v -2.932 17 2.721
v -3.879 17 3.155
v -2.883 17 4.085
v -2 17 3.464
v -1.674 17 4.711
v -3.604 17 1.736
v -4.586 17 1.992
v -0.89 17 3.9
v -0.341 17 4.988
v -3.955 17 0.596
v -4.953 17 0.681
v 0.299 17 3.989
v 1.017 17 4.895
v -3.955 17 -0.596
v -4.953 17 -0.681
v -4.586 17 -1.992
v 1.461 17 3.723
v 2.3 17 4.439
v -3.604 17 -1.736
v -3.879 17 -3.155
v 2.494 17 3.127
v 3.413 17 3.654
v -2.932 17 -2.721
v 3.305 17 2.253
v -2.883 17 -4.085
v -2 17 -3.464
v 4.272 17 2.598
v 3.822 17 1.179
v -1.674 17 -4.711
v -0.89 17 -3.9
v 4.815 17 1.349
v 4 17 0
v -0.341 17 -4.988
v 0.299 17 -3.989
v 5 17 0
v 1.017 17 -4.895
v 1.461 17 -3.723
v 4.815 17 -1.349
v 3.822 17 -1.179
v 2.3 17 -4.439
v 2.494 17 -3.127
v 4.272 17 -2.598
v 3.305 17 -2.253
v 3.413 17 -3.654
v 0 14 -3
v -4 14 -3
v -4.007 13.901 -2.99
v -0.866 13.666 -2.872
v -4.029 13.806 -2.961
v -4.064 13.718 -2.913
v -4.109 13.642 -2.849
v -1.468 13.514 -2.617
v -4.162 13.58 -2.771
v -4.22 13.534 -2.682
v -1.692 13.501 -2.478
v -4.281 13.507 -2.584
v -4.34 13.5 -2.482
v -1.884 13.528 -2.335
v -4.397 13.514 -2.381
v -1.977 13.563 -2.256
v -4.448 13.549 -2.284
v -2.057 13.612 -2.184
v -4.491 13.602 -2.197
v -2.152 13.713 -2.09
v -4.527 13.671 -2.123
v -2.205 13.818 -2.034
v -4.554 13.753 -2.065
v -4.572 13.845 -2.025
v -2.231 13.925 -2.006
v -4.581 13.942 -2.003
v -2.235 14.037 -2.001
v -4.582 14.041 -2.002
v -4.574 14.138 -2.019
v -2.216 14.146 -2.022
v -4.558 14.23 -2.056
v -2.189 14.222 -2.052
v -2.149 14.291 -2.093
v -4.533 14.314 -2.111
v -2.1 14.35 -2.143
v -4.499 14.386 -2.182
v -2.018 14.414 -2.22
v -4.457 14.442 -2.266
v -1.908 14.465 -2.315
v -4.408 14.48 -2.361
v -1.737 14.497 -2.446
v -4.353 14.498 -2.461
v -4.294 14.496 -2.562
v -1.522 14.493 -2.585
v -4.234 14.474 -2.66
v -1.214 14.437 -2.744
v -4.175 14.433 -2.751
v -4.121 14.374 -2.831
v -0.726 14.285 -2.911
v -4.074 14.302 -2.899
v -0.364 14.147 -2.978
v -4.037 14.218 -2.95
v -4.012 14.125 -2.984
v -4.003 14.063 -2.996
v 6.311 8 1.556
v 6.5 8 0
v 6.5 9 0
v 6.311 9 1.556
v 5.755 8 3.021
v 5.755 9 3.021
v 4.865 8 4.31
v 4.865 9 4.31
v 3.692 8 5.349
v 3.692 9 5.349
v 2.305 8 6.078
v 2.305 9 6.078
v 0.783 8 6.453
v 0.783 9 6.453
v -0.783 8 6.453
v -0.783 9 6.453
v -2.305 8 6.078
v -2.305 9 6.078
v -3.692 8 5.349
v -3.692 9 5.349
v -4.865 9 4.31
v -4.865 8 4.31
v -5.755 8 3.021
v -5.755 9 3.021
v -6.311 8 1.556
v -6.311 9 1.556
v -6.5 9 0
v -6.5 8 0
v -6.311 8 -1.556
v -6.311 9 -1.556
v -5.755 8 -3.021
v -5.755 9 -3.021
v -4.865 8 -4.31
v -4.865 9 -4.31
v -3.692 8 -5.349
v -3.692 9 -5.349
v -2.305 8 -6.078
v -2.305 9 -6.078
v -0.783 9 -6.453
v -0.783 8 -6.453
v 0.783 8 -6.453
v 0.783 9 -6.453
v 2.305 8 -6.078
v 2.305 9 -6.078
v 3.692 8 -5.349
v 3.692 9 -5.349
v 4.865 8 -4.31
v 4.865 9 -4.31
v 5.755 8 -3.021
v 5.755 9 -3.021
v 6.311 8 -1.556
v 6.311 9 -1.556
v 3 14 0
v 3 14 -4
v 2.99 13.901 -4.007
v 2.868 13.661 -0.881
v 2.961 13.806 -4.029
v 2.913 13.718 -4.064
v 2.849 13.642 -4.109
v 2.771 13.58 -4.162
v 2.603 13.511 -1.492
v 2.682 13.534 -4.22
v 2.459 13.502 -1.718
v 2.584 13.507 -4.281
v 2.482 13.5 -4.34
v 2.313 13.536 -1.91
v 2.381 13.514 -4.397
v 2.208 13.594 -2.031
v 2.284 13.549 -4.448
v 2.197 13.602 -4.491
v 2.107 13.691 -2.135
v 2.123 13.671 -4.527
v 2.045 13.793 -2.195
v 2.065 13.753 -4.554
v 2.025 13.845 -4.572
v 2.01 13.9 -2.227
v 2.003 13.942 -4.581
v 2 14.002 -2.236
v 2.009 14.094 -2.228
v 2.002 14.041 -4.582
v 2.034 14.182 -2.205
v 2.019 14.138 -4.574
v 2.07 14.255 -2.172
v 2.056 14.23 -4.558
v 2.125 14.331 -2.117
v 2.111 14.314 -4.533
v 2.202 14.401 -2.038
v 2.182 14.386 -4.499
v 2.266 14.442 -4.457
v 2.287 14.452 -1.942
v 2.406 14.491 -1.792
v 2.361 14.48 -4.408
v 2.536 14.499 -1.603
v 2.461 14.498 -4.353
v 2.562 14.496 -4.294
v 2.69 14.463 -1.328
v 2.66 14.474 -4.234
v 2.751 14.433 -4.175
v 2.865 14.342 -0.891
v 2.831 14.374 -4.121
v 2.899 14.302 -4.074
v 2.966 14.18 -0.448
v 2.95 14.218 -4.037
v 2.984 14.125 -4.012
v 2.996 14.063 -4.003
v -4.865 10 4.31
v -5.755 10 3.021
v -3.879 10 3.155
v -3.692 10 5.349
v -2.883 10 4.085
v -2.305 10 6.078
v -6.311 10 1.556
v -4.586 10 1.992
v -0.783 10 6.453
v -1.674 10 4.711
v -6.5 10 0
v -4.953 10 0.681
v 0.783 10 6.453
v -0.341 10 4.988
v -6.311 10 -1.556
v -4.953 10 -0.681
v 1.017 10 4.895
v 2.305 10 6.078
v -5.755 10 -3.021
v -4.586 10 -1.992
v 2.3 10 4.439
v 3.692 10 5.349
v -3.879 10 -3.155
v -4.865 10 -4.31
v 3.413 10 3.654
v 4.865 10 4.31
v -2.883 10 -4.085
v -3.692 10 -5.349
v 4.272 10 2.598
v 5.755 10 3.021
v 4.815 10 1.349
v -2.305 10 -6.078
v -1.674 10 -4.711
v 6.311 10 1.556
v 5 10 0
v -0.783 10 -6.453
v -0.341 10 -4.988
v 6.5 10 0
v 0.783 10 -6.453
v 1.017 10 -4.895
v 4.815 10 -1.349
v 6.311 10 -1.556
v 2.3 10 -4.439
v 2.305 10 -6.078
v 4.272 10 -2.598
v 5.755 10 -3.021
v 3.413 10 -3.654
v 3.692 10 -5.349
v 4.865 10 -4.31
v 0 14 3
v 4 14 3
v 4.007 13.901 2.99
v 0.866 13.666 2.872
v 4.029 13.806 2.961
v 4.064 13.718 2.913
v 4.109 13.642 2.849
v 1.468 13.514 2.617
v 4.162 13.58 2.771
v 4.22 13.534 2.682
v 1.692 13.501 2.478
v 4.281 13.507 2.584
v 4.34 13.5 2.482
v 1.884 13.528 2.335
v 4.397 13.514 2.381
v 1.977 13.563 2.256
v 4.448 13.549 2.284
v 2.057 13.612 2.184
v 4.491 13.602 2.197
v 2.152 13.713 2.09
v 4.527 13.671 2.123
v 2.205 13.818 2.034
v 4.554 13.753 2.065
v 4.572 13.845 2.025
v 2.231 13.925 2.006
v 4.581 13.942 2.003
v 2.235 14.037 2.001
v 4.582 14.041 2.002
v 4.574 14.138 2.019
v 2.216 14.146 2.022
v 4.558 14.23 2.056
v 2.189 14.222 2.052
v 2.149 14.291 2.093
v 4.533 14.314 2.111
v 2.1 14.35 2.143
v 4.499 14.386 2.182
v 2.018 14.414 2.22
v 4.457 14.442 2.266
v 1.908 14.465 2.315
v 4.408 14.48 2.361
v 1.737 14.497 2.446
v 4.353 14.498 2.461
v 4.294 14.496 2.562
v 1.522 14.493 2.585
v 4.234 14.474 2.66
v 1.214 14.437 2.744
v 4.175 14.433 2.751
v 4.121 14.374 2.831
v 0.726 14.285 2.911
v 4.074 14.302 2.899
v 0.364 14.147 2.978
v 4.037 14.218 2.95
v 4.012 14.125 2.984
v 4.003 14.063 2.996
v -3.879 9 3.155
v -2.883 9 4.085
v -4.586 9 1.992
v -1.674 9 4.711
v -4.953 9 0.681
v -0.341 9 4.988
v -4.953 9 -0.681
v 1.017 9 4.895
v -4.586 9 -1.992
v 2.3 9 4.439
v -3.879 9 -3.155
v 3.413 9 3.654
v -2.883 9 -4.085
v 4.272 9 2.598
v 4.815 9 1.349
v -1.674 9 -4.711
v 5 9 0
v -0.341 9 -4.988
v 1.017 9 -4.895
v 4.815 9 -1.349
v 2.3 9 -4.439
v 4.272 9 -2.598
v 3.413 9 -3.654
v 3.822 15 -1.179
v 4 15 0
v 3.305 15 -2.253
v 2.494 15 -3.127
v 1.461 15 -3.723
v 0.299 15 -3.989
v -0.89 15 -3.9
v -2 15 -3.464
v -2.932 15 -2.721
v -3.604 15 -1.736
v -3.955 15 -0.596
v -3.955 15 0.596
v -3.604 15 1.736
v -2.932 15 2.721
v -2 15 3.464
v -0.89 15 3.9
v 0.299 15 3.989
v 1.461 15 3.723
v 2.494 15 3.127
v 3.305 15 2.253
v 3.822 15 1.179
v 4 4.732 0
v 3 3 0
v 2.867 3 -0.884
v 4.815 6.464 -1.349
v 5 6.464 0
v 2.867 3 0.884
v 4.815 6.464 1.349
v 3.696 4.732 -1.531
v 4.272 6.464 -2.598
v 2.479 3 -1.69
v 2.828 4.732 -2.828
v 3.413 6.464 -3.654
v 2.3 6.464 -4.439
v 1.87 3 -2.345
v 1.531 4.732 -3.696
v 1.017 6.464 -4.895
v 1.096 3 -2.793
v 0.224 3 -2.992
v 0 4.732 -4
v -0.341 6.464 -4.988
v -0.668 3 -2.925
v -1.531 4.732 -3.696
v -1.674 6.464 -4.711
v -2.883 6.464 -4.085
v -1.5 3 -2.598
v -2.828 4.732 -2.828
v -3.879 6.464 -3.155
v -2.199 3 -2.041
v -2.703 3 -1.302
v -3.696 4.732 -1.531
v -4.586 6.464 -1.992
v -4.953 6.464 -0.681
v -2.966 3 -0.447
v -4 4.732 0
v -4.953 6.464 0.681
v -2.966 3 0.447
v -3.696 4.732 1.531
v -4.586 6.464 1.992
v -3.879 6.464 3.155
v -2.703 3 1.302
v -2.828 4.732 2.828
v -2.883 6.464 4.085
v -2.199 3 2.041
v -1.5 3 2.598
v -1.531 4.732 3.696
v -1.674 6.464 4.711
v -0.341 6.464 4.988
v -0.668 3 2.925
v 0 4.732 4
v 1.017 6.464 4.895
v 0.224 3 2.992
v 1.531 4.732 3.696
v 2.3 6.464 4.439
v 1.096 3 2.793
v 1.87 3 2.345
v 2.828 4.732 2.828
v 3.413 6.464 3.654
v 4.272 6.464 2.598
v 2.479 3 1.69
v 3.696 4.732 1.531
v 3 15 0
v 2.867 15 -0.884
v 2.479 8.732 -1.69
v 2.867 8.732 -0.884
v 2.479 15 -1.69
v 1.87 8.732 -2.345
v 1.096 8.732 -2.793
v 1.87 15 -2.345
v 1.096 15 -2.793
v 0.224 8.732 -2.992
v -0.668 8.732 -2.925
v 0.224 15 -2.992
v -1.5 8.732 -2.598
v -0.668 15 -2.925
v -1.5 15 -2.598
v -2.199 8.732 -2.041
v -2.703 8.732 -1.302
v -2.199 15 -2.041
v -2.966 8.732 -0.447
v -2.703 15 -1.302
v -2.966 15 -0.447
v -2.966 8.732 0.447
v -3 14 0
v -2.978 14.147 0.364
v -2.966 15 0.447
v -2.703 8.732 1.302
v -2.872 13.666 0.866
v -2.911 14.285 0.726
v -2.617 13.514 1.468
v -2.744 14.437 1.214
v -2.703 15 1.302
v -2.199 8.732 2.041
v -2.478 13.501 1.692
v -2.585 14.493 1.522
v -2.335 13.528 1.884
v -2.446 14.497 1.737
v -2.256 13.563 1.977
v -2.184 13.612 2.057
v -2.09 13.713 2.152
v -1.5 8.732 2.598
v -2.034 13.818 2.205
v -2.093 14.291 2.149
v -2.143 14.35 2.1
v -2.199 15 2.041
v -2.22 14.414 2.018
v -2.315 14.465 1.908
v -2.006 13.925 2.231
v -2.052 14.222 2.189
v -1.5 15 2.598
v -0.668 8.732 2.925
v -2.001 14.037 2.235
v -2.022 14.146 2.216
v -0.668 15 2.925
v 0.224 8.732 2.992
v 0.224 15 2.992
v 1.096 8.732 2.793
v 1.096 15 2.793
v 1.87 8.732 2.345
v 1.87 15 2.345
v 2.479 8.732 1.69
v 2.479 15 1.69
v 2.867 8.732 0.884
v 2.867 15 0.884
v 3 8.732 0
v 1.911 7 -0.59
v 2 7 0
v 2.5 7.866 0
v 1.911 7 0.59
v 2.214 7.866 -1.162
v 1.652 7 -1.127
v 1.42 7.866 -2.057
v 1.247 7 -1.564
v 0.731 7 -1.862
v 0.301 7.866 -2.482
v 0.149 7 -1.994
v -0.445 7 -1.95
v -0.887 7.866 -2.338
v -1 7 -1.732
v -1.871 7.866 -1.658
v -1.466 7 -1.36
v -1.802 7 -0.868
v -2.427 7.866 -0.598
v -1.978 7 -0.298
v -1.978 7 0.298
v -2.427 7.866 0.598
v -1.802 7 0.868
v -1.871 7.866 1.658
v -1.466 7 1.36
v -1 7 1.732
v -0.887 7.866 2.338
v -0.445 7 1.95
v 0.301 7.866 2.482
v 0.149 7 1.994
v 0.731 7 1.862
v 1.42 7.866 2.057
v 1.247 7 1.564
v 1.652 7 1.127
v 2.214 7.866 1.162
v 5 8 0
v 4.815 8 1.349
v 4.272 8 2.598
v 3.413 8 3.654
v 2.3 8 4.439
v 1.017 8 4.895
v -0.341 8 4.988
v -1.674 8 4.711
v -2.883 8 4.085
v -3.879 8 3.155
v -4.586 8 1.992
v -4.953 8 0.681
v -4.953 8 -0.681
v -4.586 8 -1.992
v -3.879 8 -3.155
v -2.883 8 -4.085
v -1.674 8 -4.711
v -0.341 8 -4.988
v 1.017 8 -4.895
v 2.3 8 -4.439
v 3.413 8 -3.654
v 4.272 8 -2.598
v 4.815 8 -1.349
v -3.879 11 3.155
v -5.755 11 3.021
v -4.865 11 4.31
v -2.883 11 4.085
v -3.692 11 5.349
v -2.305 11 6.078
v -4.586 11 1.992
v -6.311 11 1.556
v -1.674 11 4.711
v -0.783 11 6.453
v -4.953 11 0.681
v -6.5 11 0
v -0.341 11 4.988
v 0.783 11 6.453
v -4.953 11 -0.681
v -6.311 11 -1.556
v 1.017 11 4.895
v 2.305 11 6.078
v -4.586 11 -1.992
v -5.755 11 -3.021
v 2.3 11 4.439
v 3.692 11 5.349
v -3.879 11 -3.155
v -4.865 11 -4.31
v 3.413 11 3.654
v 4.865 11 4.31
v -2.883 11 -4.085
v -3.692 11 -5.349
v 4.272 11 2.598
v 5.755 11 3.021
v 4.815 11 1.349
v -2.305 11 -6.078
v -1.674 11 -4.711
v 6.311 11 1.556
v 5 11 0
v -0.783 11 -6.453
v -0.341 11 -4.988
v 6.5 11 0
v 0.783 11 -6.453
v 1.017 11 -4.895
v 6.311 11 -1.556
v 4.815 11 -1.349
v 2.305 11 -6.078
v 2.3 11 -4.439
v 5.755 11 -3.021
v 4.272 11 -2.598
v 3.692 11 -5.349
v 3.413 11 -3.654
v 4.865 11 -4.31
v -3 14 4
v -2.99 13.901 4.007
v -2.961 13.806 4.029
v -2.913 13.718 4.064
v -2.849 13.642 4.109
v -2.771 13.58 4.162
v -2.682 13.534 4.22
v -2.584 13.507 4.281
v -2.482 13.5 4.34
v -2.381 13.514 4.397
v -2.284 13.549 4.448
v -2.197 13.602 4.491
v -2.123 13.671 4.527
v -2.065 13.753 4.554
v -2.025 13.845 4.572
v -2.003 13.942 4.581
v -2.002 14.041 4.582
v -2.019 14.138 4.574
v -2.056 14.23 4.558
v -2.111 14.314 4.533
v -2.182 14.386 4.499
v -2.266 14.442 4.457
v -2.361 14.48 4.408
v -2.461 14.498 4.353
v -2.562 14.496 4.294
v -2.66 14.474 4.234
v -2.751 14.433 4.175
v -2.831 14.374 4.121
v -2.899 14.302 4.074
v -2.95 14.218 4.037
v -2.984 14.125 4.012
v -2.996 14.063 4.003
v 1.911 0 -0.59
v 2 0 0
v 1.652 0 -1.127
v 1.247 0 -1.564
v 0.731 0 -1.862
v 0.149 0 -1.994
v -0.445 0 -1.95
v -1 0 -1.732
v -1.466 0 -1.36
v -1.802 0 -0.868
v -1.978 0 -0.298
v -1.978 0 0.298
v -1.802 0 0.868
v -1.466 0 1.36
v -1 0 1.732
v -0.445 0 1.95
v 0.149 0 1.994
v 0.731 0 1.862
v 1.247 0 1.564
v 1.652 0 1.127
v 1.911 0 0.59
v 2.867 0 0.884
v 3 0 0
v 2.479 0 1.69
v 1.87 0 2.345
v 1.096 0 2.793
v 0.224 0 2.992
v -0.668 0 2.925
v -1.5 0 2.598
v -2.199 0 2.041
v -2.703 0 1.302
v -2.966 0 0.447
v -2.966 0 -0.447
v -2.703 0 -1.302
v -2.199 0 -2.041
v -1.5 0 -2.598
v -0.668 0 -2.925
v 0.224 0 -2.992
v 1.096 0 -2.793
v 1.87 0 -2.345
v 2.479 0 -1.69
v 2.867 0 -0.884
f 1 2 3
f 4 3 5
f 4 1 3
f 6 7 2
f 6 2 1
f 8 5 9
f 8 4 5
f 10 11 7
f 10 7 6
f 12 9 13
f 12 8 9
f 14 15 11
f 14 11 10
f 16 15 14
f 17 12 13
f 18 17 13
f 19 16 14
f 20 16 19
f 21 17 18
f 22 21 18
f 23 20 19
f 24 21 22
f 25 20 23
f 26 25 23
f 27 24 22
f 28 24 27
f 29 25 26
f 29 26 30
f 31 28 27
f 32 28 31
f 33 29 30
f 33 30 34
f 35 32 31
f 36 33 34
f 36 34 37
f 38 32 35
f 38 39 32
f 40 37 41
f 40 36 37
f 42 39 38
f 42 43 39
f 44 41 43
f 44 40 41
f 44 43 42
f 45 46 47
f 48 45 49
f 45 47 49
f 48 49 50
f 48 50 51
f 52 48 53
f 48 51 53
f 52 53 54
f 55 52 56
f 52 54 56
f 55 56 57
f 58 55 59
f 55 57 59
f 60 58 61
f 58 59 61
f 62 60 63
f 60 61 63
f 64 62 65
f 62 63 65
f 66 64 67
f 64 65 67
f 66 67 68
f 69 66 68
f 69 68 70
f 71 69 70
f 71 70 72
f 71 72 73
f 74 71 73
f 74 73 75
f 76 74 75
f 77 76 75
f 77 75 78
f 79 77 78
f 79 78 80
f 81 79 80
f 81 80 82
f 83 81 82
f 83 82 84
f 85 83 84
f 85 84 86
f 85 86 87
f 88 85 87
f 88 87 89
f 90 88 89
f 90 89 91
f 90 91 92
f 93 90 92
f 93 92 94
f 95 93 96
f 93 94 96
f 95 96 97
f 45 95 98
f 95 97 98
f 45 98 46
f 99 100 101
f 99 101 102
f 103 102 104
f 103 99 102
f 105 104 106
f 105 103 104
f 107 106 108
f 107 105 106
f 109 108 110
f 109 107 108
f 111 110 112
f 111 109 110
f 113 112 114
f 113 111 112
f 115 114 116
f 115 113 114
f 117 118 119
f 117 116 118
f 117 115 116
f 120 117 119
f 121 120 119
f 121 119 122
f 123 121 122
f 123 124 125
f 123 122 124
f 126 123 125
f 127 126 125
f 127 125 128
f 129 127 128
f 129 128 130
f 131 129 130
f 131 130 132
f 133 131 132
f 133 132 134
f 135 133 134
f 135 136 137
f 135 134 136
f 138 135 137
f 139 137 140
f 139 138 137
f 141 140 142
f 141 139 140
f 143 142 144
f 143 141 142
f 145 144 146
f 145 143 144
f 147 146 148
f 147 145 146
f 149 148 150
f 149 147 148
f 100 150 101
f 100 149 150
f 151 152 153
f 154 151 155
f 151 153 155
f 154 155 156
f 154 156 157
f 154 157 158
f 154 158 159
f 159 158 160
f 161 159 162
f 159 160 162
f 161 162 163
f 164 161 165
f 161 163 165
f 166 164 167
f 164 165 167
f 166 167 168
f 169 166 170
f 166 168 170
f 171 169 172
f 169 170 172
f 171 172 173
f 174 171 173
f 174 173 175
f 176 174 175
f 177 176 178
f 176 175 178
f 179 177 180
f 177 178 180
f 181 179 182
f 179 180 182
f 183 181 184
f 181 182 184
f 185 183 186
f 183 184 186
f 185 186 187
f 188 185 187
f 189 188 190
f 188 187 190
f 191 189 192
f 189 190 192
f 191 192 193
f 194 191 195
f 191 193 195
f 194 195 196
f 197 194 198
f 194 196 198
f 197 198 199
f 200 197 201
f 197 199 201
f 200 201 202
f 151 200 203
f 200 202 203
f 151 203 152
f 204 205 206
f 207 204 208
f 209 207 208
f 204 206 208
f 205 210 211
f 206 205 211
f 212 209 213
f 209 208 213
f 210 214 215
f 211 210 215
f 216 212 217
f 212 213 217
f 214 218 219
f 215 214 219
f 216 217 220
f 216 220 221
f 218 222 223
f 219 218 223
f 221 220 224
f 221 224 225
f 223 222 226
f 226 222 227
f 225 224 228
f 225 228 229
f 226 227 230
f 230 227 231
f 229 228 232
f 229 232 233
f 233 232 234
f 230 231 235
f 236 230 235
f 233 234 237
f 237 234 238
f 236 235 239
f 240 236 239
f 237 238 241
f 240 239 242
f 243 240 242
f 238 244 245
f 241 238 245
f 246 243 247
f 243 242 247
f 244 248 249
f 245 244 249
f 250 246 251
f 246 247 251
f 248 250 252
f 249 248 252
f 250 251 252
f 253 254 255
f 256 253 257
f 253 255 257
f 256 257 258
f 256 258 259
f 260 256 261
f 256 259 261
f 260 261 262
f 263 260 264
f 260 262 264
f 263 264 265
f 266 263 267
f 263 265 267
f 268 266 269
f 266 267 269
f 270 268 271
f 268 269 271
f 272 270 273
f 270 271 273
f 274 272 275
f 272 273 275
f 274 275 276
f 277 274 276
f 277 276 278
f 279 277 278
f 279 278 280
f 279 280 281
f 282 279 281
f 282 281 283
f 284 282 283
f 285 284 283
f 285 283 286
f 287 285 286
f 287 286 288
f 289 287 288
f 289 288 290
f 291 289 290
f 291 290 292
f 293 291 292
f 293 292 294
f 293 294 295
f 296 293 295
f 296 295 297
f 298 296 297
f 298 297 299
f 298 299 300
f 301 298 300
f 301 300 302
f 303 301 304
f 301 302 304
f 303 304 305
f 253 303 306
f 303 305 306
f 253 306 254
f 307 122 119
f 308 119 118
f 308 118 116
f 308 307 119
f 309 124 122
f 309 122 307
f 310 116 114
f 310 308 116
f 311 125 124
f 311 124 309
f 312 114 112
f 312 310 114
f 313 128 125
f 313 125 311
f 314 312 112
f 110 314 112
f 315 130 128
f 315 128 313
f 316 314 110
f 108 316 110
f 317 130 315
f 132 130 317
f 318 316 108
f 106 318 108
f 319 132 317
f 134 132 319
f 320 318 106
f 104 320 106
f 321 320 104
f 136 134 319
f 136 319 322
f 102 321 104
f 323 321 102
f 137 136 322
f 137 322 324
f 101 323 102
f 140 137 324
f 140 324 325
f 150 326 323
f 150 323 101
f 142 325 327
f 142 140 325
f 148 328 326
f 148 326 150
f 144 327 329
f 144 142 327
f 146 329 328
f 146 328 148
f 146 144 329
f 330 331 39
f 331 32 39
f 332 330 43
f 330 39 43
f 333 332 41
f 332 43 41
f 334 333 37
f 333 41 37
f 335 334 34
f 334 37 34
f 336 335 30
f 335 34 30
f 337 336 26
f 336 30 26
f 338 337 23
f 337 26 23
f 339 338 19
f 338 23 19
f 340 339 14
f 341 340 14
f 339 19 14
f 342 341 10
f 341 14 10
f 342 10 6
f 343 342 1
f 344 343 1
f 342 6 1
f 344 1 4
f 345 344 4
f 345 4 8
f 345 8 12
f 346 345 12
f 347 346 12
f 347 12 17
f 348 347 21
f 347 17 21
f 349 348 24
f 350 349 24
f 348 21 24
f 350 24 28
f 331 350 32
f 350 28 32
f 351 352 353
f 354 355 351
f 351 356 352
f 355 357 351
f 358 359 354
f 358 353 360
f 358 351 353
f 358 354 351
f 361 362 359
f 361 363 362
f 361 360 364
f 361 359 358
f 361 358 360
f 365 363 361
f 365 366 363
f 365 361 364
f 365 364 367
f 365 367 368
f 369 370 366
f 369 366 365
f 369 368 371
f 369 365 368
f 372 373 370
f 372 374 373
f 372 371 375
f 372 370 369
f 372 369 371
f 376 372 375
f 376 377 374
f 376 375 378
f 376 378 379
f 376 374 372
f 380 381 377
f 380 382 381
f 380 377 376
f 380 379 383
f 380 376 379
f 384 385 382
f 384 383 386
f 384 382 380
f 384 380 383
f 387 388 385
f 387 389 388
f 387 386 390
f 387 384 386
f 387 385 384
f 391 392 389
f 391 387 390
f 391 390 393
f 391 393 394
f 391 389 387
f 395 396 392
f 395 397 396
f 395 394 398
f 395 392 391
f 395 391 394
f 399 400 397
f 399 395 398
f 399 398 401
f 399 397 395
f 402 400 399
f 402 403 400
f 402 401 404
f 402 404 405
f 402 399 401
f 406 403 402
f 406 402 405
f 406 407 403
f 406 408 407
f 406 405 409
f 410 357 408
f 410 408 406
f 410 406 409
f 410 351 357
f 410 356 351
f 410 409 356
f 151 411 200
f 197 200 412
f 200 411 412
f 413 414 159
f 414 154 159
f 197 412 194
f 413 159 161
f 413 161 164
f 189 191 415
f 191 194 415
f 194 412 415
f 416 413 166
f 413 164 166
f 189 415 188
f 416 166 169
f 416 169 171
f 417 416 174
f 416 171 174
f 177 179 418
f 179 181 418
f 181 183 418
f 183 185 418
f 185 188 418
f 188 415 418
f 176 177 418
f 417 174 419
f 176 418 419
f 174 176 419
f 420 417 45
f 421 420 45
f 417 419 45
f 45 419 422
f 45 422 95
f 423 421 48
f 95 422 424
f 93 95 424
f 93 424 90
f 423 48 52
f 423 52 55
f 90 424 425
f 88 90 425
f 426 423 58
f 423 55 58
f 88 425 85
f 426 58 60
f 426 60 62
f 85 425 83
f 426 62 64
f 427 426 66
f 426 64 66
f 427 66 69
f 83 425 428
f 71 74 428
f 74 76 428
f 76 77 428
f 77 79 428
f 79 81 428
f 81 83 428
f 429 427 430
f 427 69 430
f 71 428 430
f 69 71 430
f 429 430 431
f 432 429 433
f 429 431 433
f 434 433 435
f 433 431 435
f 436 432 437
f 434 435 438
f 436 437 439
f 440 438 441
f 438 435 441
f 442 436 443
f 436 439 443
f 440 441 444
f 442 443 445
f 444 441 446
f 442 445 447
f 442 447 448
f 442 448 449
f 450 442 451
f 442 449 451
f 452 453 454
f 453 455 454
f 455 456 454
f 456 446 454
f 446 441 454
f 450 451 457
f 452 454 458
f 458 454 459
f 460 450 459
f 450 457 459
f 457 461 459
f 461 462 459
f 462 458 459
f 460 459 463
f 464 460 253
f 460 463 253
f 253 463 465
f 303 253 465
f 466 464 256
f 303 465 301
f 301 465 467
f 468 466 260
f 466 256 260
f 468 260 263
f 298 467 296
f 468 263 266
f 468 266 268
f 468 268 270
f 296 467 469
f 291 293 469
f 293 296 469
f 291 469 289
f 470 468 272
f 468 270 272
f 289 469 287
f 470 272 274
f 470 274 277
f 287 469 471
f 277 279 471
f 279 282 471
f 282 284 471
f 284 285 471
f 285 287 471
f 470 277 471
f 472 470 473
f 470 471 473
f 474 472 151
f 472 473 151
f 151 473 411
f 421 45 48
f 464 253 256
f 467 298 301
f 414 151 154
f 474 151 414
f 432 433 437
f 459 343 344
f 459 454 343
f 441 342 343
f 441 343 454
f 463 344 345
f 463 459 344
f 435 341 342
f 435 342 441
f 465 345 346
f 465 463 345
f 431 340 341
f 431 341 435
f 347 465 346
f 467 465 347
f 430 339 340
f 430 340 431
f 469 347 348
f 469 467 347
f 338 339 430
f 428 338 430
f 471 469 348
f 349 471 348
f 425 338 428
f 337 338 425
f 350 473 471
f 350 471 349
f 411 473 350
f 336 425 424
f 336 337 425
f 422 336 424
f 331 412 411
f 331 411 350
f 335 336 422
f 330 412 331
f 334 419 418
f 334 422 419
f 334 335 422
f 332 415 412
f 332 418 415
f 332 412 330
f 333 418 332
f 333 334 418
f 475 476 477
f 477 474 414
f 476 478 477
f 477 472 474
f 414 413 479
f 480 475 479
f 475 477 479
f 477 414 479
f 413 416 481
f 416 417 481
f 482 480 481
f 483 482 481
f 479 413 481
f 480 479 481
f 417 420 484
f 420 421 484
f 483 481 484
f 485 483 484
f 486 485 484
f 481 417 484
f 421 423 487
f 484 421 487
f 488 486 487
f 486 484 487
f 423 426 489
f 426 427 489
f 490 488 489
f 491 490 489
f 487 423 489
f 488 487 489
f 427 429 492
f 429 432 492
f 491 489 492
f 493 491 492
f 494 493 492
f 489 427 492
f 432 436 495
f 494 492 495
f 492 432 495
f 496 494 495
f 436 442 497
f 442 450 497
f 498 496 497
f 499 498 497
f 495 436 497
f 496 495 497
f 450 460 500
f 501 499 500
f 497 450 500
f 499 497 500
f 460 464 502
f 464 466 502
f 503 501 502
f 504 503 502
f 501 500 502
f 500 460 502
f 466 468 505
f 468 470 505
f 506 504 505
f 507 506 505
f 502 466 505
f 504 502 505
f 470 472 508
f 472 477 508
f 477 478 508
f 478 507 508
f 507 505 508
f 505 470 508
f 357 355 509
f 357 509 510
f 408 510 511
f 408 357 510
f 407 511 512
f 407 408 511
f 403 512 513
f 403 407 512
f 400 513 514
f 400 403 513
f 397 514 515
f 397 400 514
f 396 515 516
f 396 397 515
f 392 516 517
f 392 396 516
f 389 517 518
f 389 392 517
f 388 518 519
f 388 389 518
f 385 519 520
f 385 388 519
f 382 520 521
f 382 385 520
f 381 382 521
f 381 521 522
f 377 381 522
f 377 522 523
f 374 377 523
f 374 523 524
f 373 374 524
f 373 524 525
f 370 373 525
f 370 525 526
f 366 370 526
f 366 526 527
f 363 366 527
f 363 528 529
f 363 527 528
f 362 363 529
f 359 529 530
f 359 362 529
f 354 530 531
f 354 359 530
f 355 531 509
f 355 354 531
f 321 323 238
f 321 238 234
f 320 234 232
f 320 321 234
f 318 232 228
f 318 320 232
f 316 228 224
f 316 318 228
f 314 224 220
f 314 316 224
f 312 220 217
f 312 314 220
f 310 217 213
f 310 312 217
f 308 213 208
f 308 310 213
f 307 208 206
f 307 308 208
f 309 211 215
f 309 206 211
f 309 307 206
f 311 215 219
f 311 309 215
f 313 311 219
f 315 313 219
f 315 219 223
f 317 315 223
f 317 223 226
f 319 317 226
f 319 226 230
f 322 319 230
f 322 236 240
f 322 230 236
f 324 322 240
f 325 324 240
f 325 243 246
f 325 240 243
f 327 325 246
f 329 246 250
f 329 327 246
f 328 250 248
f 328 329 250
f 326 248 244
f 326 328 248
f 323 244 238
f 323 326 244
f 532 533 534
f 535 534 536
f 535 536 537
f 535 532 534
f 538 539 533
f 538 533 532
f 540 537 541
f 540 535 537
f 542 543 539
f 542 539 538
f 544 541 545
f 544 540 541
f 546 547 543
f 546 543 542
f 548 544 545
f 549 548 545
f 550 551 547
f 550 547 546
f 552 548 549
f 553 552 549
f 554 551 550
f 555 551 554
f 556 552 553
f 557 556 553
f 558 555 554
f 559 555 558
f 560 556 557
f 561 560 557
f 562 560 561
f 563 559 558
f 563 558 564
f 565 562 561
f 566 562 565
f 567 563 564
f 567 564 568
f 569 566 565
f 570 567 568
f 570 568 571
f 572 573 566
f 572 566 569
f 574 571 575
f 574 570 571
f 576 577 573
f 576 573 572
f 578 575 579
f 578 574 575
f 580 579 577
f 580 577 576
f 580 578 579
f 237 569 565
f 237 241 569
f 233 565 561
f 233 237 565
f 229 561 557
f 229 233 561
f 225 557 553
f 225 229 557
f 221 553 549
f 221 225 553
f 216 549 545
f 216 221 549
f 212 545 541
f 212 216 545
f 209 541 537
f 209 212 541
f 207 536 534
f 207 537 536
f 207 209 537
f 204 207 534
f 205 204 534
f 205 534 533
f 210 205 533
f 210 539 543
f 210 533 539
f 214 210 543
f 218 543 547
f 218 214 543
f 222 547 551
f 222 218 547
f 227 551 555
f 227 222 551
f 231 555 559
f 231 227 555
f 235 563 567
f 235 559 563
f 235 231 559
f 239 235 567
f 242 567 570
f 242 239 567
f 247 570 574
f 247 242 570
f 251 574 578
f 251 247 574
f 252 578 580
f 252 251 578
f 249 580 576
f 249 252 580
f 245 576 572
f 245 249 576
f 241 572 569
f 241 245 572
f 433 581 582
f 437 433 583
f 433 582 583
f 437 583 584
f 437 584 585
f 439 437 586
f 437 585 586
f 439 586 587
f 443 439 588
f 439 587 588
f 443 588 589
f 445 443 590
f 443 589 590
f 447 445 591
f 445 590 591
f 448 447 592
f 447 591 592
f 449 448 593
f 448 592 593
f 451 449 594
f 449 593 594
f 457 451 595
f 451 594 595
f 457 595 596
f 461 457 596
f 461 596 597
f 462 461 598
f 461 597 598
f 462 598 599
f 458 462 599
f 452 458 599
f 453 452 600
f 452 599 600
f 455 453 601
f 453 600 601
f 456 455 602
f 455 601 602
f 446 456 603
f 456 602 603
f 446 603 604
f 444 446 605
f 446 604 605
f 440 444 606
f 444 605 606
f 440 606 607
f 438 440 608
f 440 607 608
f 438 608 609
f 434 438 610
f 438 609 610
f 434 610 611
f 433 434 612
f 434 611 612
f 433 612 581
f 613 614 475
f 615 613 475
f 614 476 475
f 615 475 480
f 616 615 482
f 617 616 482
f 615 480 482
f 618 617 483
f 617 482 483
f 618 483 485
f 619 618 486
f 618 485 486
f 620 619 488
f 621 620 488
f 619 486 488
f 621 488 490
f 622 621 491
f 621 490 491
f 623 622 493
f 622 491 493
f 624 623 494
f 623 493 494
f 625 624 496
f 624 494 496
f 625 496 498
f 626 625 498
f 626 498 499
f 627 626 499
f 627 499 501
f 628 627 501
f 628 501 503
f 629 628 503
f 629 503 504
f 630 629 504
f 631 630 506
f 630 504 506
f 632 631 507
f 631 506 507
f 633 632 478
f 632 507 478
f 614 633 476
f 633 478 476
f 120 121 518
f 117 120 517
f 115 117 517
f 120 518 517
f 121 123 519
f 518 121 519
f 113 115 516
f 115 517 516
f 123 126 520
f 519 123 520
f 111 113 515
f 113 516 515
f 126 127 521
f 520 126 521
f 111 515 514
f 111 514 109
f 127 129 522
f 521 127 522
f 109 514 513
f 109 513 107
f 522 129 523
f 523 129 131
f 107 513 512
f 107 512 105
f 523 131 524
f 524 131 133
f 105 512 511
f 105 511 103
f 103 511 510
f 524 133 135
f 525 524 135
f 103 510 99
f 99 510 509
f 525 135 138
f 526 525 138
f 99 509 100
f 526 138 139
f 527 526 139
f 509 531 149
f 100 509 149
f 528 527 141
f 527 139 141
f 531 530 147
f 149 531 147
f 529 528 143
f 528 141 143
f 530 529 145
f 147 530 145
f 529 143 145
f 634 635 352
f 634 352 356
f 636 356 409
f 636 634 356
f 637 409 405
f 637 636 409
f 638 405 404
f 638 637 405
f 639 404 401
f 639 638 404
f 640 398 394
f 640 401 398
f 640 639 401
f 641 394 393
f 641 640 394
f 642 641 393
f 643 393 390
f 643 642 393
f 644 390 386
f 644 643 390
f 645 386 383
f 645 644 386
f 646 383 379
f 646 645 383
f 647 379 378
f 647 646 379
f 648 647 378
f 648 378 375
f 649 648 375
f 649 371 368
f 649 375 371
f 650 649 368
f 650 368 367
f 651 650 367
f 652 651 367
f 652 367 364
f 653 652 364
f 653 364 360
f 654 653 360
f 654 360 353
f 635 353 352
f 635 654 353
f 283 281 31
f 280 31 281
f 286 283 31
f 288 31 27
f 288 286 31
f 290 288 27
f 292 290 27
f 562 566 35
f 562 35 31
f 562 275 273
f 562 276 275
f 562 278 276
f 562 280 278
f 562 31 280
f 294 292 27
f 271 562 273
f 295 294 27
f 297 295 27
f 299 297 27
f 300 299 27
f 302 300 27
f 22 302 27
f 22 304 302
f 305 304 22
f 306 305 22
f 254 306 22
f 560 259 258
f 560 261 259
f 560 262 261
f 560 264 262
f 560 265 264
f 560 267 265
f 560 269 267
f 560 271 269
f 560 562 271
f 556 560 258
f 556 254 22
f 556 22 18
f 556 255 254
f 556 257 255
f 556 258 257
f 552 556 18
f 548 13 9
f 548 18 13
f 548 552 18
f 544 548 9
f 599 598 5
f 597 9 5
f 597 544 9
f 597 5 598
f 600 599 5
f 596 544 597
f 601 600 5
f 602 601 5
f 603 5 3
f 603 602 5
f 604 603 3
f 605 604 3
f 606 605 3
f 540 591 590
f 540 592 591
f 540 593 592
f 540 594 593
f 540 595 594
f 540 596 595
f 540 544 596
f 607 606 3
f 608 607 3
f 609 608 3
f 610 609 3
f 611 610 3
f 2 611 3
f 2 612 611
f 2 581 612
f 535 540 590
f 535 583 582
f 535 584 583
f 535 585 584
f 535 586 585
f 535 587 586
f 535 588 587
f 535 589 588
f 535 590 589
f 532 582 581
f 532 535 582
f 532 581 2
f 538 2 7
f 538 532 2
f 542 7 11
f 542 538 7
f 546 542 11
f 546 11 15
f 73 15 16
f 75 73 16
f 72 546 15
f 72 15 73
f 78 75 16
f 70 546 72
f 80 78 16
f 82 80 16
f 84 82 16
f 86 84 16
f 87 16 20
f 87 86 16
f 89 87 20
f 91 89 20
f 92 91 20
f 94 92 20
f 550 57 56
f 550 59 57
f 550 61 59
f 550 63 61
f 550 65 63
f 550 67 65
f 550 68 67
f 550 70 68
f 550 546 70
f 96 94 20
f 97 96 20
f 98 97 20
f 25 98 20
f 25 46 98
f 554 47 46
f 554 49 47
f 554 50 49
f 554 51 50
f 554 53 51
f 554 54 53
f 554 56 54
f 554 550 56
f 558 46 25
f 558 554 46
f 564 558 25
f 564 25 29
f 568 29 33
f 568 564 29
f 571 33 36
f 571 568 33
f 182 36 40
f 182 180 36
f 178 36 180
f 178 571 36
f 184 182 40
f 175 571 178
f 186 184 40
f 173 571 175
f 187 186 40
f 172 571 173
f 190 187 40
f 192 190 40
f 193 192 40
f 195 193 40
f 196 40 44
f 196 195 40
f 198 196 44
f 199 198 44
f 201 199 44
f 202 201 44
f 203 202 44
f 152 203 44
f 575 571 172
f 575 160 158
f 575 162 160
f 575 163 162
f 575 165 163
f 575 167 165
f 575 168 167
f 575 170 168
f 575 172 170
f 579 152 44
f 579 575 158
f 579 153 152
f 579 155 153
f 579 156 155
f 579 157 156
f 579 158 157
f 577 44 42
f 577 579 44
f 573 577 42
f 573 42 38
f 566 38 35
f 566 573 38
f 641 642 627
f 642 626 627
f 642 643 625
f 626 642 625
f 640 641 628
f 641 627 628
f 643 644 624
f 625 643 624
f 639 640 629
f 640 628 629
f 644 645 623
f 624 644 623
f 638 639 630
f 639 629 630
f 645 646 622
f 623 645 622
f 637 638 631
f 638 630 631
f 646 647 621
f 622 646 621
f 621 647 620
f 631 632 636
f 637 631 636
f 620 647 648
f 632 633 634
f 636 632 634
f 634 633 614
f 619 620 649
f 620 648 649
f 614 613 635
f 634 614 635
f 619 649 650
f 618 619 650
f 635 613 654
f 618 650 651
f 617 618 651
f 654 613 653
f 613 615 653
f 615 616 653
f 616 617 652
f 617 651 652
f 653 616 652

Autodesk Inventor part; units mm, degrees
ref_plane "YZ Plane" through (0, 0, 0) normal (1, 0, 0) x (0, 1, 0)
ref_plane "XZ Plane" through (0, 0, 0) normal (0, 1, 0) x (-1, 0, 0)
sketch "Sketch1" plane through (0, 0, 0) normal (0, 0, 1) x (1, 0, 0)
  line L0 (2, 0) -> (2, 7)
  line L1 (2, 7) -> (3, 8.7321)
  line L2 (3, 8.7321) -> (3, 15)
  line L3 (3, 15) -> (4, 15)
  line L4 (4, 15) -> (4, 17)
  line L5 (4, 17) -> (5, 17)
  line L6 (5, 17) -> (5, 11)
  line L7 (5, 11) -> (6.5, 11)
  line L8 (6.5, 11) -> (6.5, 10)
  line L9 (6.5, 10) -> (5, 10)
  line L10 (5, 10) -> (5, 9)
  line L11 (5, 9) -> (6.5, 9)
  line L12 (6.5, 9) -> (6.5, 8)
  line L13 (6.5, 8) -> (5, 8)
  line L14 (5, 8) -> (5, 6.4641)
  line L15 (5, 6.4641) -> (3, 3)
  line L16 (3, 3) -> (3, 0)
  line L17 (3, 0) -> (2, 0)
  line L18 (0, -3.4) -> (0, 20.4) projected
  point P0 (0, 0)
  dimension "d0" = 7
  dimension "d1" = 17
  dimension "d2" = 2
  dimension "d3" = 3
  dimension "d4" = 1
  dimension "d5" = 1
  dimension "d6" = 1
  dimension "d7" = 2
  dimension "d8" = 11
  dimension "d9" = 1.5
  dimension "d10" = 5
  dimension "d11" = 60
  dimension "d13" = 4
  dimension "d14" = 3
  dimension "d48" = 4
revolve "Revolution1" add sketch "Sketch1" angle 360 about axis through (0, -10, 0) along (0, 1, 0)
sketch "Sketch2" plane through (0, 0, 0) normal (1, 0, 0) x (0, 1, 0)
  line L0 (8.7321, 3) -> (15, 3) projected
  point P0 (0, 0)
  point P1 (14, 3)
  dimension "d15" = 1
  dimension "d35" = 3
ref_plane "Work Plane1" through (0, 14, 3) normal (0, 0, -1) x (-1, 0, 0)
sketch "Sketch4" plane through (0, 0, 0) normal (1, 0, 0) x (0, 1, 0)
  line L0 (11, 6.5) -> (11, -6.5) projected
  point P0 (0, 0)
  point P1 (14, 2.5)
  dimension "d36" = 3
  dimension "d37" = 2.5
hole "Hole3" at (0, 14, 2.5) direction (1, 0, 0) diameter 1 end through all
pattern_circular "Circular Pattern2" count 4 over 360 about axis through (0, -10, 0) along (0, 1, 0) of "Hole3"
properties part number "inner element" material "Brass, Soft Yellow"
